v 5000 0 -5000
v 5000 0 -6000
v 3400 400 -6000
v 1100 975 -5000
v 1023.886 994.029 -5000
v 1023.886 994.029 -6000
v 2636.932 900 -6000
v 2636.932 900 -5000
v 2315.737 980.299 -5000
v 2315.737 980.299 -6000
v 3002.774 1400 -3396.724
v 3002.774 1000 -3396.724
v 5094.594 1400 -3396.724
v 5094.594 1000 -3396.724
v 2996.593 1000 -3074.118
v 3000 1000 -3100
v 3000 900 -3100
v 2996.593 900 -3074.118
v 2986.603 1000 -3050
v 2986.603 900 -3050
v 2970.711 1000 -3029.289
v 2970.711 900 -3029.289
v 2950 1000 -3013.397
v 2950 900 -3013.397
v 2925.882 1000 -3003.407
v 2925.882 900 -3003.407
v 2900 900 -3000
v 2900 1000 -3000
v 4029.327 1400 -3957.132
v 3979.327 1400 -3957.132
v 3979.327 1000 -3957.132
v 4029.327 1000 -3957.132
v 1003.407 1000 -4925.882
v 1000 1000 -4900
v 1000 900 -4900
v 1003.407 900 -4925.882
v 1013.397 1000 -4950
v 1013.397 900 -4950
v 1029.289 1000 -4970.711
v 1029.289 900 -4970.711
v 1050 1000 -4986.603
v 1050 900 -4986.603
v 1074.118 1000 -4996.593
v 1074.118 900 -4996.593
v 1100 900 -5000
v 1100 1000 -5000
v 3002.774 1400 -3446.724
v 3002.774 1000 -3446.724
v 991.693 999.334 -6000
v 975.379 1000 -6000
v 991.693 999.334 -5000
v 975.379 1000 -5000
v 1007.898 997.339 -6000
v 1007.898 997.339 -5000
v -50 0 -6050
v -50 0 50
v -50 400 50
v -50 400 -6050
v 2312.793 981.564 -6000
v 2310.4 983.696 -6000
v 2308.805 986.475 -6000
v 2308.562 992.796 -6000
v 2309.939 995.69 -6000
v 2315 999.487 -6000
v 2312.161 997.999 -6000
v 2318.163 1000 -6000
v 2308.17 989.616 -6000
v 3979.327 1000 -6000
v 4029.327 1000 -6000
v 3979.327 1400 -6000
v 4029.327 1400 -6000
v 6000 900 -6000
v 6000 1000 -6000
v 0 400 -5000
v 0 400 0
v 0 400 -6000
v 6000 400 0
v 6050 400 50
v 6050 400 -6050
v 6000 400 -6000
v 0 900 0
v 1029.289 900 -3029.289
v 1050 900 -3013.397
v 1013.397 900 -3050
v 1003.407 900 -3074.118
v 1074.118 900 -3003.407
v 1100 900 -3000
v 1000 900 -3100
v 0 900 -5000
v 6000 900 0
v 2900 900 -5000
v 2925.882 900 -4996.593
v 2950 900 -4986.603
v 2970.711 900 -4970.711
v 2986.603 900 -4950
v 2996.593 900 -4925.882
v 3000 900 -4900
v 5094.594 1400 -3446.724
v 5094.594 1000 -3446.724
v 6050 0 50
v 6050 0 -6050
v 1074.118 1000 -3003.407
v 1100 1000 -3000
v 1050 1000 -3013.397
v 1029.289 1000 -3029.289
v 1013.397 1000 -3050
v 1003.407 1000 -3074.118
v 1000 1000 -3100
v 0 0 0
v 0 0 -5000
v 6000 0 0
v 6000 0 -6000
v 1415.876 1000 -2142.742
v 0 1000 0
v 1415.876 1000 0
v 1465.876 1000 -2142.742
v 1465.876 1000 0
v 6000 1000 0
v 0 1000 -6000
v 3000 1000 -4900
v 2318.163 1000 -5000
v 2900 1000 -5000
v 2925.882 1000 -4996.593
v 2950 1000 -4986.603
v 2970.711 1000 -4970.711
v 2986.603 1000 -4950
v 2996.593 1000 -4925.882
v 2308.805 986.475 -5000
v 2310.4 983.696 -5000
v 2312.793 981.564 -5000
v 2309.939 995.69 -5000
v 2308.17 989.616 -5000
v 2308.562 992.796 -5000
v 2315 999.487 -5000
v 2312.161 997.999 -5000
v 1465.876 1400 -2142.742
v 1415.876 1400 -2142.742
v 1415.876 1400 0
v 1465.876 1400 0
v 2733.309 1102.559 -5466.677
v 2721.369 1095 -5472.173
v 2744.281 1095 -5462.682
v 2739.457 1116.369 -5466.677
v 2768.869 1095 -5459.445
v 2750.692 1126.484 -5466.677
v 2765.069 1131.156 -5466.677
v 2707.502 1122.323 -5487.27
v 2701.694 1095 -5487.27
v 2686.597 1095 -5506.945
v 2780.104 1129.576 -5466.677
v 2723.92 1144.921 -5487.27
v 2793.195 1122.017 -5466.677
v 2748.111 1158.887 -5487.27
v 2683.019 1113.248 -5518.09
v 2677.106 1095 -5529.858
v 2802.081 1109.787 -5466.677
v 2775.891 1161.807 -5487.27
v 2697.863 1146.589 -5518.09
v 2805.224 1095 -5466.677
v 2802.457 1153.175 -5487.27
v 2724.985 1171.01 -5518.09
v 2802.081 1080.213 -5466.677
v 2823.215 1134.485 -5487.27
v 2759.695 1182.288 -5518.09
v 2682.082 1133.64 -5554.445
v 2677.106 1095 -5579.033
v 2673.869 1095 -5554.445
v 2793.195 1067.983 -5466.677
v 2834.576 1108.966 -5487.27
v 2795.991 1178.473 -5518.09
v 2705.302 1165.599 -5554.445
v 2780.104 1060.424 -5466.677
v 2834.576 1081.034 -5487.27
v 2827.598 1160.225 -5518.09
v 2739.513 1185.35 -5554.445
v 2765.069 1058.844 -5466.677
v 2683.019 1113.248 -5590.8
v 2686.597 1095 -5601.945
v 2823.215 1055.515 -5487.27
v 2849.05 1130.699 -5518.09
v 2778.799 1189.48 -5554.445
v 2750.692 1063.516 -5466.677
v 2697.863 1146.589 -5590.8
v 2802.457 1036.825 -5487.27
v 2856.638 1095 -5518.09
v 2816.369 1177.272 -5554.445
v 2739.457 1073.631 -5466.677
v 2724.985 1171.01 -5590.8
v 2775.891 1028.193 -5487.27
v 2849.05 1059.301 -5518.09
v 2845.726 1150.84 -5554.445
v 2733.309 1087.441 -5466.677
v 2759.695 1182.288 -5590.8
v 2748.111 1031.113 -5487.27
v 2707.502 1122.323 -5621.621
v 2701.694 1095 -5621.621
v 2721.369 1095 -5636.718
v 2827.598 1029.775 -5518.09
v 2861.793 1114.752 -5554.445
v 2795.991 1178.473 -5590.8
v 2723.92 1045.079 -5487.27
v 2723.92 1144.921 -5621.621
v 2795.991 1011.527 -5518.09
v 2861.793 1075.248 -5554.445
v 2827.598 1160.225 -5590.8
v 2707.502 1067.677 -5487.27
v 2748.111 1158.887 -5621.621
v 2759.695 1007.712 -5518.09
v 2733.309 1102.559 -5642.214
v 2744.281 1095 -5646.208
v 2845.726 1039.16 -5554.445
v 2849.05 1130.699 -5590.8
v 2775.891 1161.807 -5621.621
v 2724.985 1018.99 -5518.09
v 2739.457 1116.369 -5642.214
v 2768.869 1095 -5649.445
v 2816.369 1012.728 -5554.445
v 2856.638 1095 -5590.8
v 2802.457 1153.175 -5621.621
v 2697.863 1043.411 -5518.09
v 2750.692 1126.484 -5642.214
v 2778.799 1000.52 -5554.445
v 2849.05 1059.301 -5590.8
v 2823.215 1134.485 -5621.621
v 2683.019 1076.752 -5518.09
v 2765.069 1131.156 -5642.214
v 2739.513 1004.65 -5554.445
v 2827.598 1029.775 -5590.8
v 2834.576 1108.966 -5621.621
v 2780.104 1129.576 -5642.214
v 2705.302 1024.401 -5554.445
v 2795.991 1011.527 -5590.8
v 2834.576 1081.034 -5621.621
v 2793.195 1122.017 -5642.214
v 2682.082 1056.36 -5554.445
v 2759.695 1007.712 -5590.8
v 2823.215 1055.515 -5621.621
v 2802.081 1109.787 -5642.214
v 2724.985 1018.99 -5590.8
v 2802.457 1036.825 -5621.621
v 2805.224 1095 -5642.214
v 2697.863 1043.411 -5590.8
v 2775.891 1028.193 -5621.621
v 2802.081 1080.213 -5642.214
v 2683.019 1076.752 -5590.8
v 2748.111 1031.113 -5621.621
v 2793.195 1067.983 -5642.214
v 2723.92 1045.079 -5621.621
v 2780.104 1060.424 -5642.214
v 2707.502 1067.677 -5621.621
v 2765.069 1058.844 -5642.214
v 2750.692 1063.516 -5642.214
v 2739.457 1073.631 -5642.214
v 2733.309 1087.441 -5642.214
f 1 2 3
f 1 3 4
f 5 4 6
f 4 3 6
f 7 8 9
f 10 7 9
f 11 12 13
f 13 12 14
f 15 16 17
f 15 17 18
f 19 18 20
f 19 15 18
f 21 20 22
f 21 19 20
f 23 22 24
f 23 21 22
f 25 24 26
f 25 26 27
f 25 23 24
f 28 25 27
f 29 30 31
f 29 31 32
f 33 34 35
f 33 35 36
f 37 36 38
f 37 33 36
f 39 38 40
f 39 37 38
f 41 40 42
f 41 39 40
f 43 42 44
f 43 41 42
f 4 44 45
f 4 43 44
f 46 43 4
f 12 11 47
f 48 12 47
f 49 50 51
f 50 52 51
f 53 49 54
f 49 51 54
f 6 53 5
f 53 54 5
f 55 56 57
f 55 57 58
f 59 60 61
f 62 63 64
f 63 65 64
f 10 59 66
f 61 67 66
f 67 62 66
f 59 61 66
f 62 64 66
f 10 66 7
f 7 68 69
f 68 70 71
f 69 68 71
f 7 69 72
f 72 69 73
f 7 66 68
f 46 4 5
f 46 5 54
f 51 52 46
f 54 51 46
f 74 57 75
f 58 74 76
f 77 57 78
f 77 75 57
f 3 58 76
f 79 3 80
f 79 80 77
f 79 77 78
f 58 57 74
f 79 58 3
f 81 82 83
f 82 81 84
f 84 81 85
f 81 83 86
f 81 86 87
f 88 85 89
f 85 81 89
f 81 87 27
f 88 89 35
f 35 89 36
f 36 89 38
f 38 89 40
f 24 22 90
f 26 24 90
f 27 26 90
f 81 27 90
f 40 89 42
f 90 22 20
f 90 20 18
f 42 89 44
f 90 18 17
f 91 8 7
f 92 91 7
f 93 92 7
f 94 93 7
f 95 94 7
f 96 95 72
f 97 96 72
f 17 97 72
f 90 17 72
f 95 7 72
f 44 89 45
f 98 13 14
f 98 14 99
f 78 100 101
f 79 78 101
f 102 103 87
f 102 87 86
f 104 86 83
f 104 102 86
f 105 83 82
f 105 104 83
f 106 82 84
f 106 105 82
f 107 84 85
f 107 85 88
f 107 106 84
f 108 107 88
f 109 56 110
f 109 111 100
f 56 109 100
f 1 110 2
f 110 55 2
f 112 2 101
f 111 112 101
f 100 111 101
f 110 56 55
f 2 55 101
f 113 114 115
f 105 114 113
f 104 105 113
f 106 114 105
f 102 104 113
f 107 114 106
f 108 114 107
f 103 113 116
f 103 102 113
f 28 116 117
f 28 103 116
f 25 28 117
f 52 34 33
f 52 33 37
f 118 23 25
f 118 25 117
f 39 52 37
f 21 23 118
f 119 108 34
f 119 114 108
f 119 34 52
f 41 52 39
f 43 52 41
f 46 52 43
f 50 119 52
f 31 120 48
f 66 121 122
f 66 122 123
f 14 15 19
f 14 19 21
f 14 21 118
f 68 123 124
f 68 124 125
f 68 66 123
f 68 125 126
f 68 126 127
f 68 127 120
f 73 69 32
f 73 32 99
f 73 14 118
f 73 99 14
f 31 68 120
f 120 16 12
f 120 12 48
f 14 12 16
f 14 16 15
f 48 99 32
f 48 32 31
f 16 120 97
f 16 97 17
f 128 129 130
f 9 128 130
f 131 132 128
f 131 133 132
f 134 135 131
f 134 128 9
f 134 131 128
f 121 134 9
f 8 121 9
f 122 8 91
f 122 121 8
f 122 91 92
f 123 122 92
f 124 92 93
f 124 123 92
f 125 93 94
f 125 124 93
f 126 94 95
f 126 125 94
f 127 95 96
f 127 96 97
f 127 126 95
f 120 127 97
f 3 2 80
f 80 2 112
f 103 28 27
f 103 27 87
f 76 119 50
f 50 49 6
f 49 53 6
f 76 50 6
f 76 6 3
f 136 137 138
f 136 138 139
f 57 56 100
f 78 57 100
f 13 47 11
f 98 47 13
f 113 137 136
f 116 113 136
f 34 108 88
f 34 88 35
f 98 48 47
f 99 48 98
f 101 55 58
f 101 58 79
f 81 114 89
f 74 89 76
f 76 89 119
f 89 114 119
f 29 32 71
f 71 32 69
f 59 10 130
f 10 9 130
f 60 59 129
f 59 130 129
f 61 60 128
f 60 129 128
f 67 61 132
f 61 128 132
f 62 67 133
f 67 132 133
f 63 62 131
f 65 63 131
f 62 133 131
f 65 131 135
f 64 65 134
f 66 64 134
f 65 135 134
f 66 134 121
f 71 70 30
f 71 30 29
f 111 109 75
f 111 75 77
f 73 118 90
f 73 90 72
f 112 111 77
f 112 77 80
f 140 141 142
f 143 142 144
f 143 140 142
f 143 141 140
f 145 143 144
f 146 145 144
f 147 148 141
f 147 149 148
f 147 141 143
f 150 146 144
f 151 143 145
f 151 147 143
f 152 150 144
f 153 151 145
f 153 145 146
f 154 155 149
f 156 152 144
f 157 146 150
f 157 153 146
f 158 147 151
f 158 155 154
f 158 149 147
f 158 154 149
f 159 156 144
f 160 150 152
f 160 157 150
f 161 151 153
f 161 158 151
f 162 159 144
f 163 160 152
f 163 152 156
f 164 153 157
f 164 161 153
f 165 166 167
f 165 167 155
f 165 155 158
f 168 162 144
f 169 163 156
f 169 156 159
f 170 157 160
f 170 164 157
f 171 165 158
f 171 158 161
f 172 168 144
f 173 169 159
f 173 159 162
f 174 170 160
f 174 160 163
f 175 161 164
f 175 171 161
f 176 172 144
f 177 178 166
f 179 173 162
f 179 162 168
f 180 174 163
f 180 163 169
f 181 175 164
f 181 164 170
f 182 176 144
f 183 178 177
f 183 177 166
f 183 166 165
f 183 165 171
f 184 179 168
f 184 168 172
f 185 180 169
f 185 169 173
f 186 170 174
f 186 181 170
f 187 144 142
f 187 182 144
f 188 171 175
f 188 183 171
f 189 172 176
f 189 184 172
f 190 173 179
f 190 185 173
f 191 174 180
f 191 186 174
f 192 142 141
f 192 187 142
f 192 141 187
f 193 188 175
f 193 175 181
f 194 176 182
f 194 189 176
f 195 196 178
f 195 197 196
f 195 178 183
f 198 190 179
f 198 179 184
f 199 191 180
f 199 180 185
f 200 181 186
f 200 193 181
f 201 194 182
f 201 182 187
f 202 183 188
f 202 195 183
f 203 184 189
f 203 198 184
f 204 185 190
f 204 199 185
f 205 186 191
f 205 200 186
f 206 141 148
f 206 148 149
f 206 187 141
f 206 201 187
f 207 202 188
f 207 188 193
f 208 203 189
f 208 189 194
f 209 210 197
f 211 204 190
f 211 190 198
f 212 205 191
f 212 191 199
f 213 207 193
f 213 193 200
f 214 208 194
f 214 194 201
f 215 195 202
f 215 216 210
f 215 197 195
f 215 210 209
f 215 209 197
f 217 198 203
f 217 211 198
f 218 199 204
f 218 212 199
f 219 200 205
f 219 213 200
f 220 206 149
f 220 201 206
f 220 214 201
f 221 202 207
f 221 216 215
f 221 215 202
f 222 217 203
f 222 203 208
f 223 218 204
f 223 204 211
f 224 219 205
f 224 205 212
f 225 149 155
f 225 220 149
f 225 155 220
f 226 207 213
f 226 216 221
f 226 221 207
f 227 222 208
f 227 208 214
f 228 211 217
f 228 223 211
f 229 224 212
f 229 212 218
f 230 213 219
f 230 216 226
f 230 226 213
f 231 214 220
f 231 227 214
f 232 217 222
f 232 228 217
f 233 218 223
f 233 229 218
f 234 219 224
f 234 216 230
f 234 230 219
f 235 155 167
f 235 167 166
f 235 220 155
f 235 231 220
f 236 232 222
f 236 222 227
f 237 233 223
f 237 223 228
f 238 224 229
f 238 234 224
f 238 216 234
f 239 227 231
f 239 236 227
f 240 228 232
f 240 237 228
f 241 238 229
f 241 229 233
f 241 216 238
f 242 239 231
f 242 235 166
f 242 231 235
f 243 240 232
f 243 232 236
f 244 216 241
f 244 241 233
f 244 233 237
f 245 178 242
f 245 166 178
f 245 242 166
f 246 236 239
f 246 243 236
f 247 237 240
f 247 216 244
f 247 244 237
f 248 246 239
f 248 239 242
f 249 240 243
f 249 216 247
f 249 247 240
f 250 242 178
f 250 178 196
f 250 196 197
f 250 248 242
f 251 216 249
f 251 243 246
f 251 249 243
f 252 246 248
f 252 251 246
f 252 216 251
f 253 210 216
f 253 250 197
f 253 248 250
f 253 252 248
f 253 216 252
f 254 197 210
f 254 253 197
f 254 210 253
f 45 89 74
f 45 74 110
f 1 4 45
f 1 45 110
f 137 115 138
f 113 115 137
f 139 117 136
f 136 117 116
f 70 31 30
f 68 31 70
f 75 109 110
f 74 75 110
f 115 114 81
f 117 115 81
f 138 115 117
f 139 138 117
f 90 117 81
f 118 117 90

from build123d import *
from build123d.topology import SkipClean

# Parameters (mm, degrees)
SKETCH_1_W          = 6100
SKETCH_1_H          = 6100
SKETCH_1_W_2        = 6000
SKETCH_1_H_2        = 6000
EXTRUDE_1_DEPTH     = 400
EXTRUDE_2_DEPTH     = 1000
SKETCH_6_W          = 6000
SKETCH_6_H          = 6000
EXTRUDE_3_DEPTH     = 100
CUT_EXTRUDE_1_DEPTH = 300
FILLET_1_R          = 10
FILLET_2_R          = 200
SKETCH_10_W         = 50
SKETCH_10_H         = 2142.742214085
SKETCH_10_W_2       = 2091.819969514
SKETCH_10_H_2       = 50
SKETCH_10_H_3       = 2042.86752058
EXTRUDE_4_DEPTH     = 400


with BuildPart() as part:
    # 草图1 → 凸台-拉伸1 (new body)
    with BuildSketch(Plane(origin=(0, 0, 0), x_dir=(1, 0, 0), z_dir=(0, 1, 0))):
        with Locations((3000, 3000)):
            Rectangle(SKETCH_1_W, SKETCH_1_H)
        with Locations((3000, 3000)):
            Rectangle(SKETCH_1_W_2, SKETCH_1_H_2, mode=Mode.SUBTRACT)
    extrude(amount=EXTRUDE_1_DEPTH)

    # 草图5 → 凸台-拉伸2 (add)
    with BuildSketch(Plane.XY.offset(-6000)):
        Polygon((5000, 0), (1000, 1000), (0, 1000), (0, 0), align=None)
    extrude(amount=EXTRUDE_2_DEPTH)

    # 草图6 → 凸台-拉伸3 (add)
    with BuildSketch(Plane(origin=(0, 1000, 0), x_dir=(1, 0, 0), z_dir=(0, 1, 0))):
        with Locations((3000, 3000)):
            Rectangle(SKETCH_6_W, SKETCH_6_H)
        with BuildLine():
            Line((1100, 5000), (2900, 5000))
            ThreePointArc((2900, 5000), (2970.710678119, 4970.710678119), (3000, 4900))
            Line((3000, 4900), (3000, 3100))
            ThreePointArc((3000, 3100), (2970.710678119, 3029.289321881), (2900, 3000))
            Line((2900, 3000), (1100, 3000))
            ThreePointArc((1100, 3000), (1029.289321881, 3029.289321881), (1000, 3100))
            Line((1000, 3100), (1000, 4900))
            ThreePointArc((1000, 4900), (1029.289321881, 4970.710678119), (1100, 5000))
        make_face(mode=Mode.SUBTRACT)
    extrude(amount=-EXTRUDE_3_DEPTH)

    # 草图9 → 切除-拉伸1 (cut)
    with BuildSketch(Plane(origin=(294.117647059, 1176.470588235, 0), x_dir=(0.9701425001453319, -0.24253562503633308, 0), z_dir=(0.24253562503633308, 0.9701425001453319, 0))):
        Polygon((-97.014250015, 5000), (-97.014250015, 6000), (3201.47025048, 6000), (4850.712500727, 6000), (4850.712500727, 5000), align=None)
    extrude(amount=CUT_EXTRUDE_1_DEPTH, mode=Mode.SUBTRACT)

    # 圆角1
    fillet_1_edges = [part.edges().sort_by_distance(p)[0] for p in [
        (2236.931687685, 1000, -5500),
    ]]
    fillet(fillet_1_edges, radius=FILLET_1_R)

    # 圆角2
    fillet_2_edges = [part.edges().sort_by_distance(p)[0] for p in [
        (1000, 1000, -5500),
    ]]
    fillet(fillet_2_edges, radius=FILLET_2_R)

    # 草图10 → 凸台-拉伸4 (add)
    with BuildSketch(Plane(origin=(0, 1000, 0), x_dir=(1, 0, 0), z_dir=(0, 1, 0))):
        with Locations((1440.876389135, 1071.371107043)):
            Rectangle(SKETCH_10_W, SKETCH_10_H)
        with Locations((4048.684281799, 3421.724476977)):
            Rectangle(SKETCH_10_W_2, SKETCH_10_H_2)
        with Locations((4004.326855754, 4978.56623971)):
            Rectangle(SKETCH_10_W, SKETCH_10_H_3)
    extrude(amount=EXTRUDE_4_DEPTH)


with BuildPart() as body_2:
    # 草图12 → 旋转2 (revolve)
    with SkipClean():  # the faces are left unmerged after this step: merging them gives an invalid solid
        with BuildSketch(Plane(origin=(0, 1095, 0), x_dir=(1, 0, 0), z_dir=(0, 1, 0)), mode=Mode.PRIVATE) as revolve_2_sk:
            with BuildLine():
                ThreePointArc((2768.869220223, 5649.445371303), (2673.869220223, 5554.445371303), (2768.869220223, 5459.445371303))
                Line((2768.869220223, 5459.445371303), (2768.869220223, 5649.445371303))
            make_face()
            with BuildLine():
                Line((2768.869220223, 5649.445371303), (2768.869220223, 5459.445371303))
                ThreePointArc((2768.869220223, 5459.445371303), (2836.044364436, 5487.270227091), (2863.869220223, 5554.445371303))
                ThreePointArc((2863.869220223, 5554.445371303), (2836.044364436, 5621.620515516), (2768.869220223, 5649.445371303))
            make_face()
        revolve(revolve_2_sk.sketch.rotate(Axis((2768.869220223, 1095, -4554.445371303), (0, 0, -1)), 180), axis=Axis((2768.869220223, 1095, -4554.445371303), (0, 0, -1)))
    add(body_2.part.scale(1), mode=Mode.REPLACE)  # the faces are merged on a copy


solid = Compound([part.part, body_2.part])
